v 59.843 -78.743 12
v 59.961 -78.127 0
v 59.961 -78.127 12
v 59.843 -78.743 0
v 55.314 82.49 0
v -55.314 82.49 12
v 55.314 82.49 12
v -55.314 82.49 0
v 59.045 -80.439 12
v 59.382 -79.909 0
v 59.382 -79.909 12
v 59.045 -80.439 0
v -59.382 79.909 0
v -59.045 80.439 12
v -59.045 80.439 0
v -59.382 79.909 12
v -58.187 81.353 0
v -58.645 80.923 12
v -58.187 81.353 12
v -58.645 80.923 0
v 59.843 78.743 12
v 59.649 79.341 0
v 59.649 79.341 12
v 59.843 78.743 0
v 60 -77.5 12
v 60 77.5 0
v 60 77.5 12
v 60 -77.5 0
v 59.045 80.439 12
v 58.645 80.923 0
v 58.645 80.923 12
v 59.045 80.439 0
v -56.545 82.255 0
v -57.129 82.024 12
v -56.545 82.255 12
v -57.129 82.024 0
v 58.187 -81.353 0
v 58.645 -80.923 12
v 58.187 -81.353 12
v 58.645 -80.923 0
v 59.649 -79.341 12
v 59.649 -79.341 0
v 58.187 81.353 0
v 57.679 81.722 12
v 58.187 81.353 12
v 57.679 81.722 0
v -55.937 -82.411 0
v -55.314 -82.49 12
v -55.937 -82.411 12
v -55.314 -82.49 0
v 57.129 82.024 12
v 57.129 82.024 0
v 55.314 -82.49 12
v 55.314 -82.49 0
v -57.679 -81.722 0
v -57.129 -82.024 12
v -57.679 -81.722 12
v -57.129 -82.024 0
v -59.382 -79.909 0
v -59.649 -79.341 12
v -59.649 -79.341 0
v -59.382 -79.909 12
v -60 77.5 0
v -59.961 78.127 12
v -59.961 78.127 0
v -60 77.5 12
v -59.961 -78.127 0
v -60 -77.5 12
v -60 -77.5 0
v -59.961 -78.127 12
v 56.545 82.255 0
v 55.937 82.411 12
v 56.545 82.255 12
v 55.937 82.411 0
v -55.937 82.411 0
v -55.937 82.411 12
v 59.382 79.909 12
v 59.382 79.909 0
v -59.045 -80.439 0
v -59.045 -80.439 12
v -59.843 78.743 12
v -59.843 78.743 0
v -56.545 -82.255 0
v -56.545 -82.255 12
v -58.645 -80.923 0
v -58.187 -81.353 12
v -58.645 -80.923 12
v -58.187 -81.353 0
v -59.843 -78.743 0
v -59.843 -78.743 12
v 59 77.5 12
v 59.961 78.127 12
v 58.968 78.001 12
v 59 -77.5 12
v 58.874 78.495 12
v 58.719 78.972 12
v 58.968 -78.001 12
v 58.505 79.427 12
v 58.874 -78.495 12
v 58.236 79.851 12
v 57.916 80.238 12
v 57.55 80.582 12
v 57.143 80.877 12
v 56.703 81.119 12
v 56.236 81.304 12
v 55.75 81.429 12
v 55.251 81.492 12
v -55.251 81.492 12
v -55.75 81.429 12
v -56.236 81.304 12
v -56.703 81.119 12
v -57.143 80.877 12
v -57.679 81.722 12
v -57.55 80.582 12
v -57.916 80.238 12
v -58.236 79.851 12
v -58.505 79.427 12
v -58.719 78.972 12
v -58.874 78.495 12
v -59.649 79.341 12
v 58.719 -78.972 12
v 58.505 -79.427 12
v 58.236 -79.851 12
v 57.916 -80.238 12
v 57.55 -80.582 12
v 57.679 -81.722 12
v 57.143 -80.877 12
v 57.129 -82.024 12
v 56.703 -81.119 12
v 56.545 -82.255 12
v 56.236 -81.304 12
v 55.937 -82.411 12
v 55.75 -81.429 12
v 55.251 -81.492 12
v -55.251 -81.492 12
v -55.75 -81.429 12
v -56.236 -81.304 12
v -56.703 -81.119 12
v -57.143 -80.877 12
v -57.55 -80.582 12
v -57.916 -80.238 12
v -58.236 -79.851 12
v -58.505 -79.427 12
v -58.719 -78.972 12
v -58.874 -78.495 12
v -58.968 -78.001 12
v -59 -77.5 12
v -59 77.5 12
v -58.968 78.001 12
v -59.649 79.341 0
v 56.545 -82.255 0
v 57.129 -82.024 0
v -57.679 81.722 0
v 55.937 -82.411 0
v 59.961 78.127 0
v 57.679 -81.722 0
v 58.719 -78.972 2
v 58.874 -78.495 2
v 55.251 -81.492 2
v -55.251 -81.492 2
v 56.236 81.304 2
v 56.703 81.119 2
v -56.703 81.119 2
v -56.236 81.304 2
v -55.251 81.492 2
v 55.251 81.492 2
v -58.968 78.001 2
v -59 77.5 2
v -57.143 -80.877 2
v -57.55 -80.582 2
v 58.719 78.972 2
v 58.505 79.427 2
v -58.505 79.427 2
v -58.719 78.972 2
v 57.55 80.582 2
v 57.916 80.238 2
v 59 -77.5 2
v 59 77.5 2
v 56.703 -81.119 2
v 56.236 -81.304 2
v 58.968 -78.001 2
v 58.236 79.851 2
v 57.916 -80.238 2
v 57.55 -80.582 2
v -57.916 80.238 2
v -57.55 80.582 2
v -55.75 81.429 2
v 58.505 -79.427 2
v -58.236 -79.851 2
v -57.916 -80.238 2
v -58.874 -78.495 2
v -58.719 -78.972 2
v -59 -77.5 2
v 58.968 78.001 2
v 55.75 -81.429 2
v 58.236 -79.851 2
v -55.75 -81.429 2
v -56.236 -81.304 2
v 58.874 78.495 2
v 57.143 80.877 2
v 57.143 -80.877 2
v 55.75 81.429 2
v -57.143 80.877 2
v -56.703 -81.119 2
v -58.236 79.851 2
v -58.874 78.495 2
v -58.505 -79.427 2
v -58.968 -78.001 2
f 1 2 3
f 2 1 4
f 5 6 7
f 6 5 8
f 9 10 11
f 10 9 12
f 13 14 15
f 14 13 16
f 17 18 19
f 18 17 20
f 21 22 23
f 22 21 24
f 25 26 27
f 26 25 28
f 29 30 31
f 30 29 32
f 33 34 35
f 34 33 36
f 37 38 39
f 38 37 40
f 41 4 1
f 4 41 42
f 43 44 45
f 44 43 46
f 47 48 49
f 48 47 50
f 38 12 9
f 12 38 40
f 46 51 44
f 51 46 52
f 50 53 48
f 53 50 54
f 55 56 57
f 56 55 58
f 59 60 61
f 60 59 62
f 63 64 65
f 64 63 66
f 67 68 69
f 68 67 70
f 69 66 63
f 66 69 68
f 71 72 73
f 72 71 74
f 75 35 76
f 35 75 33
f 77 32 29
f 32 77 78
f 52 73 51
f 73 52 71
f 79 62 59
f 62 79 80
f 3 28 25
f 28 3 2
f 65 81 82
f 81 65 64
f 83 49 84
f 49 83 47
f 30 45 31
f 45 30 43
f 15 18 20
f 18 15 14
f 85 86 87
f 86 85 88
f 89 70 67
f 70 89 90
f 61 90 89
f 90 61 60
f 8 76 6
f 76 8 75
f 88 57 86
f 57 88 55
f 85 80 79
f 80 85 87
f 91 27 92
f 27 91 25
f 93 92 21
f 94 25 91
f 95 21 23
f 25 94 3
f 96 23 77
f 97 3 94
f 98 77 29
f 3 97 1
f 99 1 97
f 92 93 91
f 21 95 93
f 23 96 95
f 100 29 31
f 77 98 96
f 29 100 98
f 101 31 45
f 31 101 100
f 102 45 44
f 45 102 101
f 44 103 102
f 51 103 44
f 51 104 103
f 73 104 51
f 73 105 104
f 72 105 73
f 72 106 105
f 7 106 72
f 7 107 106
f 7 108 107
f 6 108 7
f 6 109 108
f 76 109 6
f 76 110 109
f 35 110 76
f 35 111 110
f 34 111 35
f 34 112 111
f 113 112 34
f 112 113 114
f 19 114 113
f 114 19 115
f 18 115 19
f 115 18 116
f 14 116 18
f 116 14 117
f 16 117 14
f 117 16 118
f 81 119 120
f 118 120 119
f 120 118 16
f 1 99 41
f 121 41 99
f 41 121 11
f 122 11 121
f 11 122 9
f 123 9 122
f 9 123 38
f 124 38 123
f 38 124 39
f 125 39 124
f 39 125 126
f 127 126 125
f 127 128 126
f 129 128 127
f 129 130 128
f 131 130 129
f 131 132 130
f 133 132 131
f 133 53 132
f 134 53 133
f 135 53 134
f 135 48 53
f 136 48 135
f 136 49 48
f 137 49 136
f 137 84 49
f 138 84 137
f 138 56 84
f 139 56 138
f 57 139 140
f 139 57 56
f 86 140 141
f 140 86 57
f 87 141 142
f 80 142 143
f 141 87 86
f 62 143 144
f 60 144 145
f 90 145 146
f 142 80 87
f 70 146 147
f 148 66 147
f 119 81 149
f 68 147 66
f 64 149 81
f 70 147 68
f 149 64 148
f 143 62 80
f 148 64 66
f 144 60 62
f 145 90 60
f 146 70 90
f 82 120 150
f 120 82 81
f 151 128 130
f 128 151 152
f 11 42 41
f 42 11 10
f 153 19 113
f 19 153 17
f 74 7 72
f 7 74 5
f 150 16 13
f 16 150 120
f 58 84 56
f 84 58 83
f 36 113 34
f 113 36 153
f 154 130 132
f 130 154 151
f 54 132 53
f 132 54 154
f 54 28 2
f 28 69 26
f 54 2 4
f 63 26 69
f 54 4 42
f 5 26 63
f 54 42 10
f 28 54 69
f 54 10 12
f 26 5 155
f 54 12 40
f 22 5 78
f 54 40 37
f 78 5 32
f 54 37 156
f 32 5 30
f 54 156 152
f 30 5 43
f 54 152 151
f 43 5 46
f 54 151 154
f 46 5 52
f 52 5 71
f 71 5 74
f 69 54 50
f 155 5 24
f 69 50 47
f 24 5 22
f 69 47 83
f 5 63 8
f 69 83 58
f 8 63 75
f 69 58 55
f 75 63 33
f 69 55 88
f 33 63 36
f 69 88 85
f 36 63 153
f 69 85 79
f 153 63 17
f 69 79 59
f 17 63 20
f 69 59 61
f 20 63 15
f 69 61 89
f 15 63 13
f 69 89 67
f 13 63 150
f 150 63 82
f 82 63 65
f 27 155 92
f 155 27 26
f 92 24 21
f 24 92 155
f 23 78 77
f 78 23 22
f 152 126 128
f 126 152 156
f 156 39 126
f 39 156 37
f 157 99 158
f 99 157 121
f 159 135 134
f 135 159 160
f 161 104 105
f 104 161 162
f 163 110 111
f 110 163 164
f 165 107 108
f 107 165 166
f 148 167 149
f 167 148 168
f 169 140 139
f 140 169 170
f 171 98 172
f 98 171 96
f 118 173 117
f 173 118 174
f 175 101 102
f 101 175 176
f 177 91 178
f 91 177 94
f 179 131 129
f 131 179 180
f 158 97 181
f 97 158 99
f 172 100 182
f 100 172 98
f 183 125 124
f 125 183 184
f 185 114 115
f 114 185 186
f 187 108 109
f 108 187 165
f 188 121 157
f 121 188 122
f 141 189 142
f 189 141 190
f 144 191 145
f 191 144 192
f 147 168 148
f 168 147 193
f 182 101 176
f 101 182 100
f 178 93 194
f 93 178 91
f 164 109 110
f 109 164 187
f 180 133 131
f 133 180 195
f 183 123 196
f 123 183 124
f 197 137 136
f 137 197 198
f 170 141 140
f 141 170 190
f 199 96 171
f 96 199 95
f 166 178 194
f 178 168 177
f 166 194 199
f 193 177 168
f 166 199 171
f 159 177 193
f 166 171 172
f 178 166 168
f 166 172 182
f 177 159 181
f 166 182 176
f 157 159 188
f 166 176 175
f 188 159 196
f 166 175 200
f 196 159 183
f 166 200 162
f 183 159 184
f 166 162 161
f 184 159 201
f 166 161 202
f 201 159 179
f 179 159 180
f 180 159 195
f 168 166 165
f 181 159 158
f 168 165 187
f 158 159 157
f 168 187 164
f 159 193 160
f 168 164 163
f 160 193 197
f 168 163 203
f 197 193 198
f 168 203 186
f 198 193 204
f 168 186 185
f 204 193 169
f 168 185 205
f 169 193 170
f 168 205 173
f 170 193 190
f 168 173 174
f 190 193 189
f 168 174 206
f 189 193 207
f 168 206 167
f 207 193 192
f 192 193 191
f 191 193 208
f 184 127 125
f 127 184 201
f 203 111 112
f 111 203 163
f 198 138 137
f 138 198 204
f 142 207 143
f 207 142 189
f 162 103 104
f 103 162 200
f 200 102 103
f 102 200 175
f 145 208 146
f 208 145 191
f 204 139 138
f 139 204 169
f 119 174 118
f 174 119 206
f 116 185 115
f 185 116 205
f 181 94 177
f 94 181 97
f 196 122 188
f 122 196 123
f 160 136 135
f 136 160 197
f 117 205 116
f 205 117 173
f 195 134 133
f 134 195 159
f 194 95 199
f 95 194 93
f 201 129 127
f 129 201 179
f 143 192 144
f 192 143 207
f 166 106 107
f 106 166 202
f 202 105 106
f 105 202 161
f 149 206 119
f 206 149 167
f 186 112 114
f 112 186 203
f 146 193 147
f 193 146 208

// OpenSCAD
$fn = 50;


difference() {
	union() {
		hull() {
			translate(v = [-55.0000000000, 77.5000000000, 0]) {
				cylinder(h = 12, r = 5);
			}
			translate(v = [55.0000000000, 77.5000000000, 0]) {
				cylinder(h = 12, r = 5);
			}
			translate(v = [-55.0000000000, -77.5000000000, 0]) {
				cylinder(h = 12, r = 5);
			}
			translate(v = [55.0000000000, -77.5000000000, 0]) {
				cylinder(h = 12, r = 5);
			}
		}
	}
	union() {
		translate(v = [0, 0, 2]) {
			hull() {
				translate(v = [-55.0000000000, 77.5000000000, 0]) {
					cylinder(h = 10, r = 4);
				}
				translate(v = [55.0000000000, 77.5000000000, 0]) {
					cylinder(h = 10, r = 4);
				}
				translate(v = [-55.0000000000, -77.5000000000, 0]) {
					cylinder(h = 10, r = 4);
				}
				translate(v = [55.0000000000, -77.5000000000, 0]) {
					cylinder(h = 10, r = 4);
				}
			}
		}
	}
}
